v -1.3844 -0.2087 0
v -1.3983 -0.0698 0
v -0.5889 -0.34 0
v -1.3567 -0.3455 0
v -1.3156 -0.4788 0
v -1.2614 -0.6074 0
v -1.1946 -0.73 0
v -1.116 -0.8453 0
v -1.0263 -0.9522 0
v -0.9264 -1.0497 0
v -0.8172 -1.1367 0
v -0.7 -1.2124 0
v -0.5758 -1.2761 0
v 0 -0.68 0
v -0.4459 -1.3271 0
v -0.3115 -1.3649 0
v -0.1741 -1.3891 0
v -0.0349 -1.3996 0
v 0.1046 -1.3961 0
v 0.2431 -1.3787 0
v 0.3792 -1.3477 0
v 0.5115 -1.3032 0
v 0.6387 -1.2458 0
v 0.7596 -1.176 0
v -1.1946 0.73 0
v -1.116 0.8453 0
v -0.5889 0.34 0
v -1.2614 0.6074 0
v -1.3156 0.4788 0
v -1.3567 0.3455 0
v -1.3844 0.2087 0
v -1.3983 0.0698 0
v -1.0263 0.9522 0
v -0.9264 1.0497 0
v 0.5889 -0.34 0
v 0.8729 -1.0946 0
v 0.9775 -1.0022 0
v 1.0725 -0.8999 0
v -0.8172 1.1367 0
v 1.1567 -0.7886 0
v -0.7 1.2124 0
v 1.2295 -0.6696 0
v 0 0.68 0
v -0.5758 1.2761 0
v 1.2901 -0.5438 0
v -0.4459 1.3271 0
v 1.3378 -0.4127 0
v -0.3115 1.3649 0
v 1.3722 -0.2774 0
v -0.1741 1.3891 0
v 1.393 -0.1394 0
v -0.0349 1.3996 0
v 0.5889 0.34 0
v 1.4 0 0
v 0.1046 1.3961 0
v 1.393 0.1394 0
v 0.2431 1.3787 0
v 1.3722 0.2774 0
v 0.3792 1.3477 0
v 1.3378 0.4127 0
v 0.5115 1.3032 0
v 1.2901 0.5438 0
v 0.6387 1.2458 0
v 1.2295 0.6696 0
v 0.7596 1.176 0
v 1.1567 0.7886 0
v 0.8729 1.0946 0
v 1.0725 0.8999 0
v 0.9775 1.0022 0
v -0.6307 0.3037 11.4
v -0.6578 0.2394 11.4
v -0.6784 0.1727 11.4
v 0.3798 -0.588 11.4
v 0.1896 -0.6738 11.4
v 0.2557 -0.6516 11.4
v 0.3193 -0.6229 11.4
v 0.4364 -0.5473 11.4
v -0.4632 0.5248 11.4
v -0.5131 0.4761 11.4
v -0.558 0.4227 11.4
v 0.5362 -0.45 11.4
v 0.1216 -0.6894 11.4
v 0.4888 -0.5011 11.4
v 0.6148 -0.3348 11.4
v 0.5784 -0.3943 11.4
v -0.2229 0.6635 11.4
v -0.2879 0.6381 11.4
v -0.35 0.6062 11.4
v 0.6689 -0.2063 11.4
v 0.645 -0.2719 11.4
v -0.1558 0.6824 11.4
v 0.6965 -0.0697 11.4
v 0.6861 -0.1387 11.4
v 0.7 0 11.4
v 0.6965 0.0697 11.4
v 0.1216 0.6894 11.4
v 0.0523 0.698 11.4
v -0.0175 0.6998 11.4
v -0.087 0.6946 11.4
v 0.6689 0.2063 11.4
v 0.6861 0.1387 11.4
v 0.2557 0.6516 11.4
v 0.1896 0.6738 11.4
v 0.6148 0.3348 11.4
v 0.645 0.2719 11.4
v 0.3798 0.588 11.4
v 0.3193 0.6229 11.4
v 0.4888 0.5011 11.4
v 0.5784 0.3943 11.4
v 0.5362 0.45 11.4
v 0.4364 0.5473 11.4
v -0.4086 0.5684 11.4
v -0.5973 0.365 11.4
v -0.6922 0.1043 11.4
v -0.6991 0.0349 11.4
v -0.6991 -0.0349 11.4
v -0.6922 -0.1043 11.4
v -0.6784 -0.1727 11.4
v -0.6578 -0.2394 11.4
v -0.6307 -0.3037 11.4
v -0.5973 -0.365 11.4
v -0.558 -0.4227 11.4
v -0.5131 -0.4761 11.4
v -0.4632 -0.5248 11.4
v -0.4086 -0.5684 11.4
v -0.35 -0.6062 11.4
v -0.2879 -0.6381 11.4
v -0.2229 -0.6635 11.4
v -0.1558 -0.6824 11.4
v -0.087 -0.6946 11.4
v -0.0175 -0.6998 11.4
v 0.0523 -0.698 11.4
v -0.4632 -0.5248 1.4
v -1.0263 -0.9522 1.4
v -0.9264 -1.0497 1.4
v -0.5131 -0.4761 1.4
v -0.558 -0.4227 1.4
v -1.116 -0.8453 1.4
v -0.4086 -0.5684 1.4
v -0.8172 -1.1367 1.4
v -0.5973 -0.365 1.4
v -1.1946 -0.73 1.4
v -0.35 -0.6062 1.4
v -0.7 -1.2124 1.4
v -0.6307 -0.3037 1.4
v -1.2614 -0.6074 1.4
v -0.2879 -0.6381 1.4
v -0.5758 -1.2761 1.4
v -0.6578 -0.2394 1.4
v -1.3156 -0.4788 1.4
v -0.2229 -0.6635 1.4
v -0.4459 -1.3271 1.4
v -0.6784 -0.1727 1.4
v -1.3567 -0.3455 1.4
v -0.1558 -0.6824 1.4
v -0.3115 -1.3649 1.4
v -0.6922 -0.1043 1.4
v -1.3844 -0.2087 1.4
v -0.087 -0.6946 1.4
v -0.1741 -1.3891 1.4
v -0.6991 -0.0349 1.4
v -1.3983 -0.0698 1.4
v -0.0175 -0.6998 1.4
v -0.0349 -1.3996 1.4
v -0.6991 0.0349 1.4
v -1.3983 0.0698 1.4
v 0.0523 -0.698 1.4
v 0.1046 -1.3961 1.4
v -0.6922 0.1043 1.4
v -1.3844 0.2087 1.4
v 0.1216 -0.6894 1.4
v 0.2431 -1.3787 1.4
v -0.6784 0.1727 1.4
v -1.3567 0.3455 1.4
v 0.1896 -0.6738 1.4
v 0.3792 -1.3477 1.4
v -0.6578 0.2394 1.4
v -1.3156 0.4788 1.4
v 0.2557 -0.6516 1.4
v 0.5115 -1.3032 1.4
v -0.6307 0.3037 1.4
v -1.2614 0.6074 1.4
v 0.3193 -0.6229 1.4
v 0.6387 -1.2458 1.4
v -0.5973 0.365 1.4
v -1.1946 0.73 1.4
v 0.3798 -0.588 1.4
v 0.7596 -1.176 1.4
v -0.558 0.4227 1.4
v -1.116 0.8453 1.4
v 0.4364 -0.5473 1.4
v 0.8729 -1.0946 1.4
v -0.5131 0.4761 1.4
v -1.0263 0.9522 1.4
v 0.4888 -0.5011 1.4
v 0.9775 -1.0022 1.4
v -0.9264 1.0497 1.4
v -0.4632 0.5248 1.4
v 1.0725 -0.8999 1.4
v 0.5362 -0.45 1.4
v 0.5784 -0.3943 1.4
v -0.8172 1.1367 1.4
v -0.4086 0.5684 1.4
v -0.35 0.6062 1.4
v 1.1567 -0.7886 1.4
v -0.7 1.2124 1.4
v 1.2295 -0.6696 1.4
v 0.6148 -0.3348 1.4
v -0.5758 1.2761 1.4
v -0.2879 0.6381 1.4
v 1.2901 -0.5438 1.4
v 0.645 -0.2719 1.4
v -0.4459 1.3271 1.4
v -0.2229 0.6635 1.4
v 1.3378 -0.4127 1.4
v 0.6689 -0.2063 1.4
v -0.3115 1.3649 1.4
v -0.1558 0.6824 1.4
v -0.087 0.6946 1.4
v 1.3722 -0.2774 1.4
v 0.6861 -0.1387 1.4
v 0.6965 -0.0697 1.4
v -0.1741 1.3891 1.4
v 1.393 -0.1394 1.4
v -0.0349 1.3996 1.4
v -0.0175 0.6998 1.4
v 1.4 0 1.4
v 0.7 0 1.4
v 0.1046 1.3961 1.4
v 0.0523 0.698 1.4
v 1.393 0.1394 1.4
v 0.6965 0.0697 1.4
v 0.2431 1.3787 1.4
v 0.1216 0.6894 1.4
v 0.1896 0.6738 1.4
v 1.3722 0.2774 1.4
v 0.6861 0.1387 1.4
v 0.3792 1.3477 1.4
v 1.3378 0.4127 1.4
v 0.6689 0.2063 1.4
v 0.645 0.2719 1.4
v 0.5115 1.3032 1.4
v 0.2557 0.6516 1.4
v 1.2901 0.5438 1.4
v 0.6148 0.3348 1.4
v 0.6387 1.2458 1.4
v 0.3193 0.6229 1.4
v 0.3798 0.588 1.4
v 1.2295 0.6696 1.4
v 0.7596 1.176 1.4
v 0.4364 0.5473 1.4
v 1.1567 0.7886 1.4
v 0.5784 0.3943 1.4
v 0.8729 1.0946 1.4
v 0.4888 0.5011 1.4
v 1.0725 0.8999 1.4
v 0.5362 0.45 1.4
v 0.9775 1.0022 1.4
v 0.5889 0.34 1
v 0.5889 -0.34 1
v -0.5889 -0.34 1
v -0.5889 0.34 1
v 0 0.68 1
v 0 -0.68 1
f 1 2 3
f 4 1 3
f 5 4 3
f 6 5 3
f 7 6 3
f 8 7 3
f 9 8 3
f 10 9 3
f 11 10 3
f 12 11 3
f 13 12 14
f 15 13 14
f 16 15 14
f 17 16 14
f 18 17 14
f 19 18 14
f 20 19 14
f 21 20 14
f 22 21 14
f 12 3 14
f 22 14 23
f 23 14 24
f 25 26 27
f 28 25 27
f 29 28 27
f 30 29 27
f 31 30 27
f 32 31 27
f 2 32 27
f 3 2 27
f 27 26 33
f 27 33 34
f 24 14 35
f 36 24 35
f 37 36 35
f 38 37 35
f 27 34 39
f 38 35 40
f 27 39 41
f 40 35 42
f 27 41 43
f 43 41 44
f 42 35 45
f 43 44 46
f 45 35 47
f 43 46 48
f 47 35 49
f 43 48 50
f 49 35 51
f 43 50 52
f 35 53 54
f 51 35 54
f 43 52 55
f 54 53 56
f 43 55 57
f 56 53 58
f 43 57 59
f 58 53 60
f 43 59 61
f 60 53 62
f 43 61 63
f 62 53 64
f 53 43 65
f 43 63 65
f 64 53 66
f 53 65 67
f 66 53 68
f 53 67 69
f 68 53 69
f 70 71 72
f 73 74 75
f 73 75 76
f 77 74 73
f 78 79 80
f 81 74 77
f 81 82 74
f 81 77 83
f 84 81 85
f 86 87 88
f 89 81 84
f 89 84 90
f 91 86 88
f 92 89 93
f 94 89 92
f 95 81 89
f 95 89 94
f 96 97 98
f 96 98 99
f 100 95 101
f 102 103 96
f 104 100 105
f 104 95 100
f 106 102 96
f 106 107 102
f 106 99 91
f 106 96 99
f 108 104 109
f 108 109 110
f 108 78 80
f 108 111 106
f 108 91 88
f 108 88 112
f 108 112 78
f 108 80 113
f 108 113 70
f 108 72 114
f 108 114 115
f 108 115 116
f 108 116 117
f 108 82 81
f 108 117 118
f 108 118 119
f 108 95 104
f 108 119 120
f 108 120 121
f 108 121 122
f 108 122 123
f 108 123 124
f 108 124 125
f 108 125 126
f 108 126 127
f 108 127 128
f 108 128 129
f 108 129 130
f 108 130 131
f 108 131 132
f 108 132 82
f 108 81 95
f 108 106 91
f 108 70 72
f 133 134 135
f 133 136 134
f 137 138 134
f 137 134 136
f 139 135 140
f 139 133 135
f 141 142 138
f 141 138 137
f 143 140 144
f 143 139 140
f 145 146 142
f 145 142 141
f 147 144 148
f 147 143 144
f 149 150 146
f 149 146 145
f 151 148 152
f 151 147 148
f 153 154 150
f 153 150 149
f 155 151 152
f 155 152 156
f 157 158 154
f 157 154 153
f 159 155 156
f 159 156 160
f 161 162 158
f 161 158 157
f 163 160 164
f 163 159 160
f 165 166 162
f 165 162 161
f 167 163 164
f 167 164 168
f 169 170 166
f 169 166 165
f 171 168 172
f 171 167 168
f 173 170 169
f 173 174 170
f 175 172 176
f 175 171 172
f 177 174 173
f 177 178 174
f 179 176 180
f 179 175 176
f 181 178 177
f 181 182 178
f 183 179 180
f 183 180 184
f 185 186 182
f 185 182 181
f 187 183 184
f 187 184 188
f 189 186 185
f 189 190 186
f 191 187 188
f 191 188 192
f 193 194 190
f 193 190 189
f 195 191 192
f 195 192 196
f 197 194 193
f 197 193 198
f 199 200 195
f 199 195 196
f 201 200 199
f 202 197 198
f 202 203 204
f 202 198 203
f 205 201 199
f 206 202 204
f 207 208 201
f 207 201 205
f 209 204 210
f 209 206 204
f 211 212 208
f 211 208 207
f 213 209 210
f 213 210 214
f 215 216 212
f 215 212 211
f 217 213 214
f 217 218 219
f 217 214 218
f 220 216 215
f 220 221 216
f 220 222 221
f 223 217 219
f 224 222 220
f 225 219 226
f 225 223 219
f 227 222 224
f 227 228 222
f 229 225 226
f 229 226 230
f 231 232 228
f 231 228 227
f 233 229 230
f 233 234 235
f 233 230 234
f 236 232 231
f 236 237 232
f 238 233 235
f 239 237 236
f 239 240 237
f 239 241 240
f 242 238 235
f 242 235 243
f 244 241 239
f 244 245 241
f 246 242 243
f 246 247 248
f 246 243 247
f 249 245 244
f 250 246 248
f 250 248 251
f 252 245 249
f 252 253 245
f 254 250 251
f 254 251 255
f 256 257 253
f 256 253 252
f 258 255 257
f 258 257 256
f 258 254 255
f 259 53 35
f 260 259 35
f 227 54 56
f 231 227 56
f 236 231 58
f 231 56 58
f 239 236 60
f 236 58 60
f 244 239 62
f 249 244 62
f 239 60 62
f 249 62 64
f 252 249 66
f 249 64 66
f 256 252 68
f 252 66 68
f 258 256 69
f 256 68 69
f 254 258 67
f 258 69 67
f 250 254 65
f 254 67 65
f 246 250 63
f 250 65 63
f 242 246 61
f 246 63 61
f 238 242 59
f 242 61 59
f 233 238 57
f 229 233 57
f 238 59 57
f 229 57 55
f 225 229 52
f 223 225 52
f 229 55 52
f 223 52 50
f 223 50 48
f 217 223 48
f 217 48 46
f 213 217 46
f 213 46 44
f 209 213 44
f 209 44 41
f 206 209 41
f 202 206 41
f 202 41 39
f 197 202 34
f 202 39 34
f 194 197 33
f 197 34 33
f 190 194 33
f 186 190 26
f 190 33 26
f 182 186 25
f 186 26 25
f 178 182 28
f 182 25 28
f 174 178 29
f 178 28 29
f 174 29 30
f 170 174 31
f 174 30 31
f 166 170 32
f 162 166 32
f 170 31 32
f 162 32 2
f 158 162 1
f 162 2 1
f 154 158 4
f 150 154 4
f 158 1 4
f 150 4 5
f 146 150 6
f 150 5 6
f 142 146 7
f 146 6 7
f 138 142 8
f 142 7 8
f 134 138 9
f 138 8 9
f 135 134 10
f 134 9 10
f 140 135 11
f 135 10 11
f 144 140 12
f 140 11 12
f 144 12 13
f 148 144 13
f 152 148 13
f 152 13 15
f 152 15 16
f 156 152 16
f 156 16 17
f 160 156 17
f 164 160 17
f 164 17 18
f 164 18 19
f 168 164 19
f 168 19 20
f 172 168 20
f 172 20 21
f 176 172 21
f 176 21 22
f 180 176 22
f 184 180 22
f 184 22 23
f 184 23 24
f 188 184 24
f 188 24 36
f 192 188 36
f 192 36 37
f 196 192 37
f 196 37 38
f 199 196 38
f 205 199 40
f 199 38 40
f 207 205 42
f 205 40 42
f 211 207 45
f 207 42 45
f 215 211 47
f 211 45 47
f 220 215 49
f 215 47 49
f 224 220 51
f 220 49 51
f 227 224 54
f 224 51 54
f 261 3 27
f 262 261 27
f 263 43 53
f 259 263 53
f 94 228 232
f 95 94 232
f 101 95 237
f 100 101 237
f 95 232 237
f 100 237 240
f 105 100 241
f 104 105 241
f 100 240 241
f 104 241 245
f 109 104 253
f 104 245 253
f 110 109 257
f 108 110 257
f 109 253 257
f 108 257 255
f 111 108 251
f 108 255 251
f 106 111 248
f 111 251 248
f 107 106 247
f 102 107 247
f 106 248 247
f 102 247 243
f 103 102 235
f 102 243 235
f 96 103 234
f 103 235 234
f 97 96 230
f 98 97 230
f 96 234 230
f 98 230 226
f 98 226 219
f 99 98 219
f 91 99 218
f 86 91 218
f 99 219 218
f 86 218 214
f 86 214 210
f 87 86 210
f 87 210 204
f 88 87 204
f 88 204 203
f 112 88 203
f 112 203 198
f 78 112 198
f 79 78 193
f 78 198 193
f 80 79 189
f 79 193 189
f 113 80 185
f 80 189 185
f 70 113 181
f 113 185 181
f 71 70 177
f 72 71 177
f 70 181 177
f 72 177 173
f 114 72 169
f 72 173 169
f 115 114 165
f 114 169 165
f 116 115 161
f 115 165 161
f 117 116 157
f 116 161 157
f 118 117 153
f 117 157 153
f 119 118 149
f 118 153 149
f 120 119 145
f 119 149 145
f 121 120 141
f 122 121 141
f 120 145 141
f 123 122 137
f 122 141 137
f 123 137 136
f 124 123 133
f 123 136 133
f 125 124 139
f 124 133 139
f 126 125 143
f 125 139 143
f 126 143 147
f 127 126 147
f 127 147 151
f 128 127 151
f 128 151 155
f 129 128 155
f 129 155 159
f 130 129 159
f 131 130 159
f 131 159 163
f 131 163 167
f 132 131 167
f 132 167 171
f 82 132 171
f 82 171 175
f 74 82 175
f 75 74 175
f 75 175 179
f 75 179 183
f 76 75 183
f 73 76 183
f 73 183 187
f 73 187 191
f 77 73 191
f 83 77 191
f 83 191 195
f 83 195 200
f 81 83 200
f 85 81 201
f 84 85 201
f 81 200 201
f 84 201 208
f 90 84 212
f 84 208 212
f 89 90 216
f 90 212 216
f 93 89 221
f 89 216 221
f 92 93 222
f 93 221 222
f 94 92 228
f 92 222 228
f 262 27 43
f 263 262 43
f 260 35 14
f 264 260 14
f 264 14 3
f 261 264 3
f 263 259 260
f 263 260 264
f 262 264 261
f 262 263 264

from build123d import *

# Parameters (mm, degrees)
SKETCH_1_R          = 1.4
EXTRUDE_1_DEPTH     = 1.4
SKETCH_2_R          = 0.7
EXTRUDE_2_DEPTH     = 10
CUT_EXTRUDE_1_DEPTH = 1


with BuildPart() as part:
    # 草图1 → 凸台-拉伸1 (new body)
    with BuildSketch(Plane.XY):
        Circle(SKETCH_1_R)
    extrude(amount=EXTRUDE_1_DEPTH)

    # 草图2 → 凸台-拉伸2 (add)
    with BuildSketch(Plane.XY.offset(1.4)):
        Circle(SKETCH_2_R)
    extrude(amount=EXTRUDE_2_DEPTH)

    # 草图3 → 切除-拉伸1 (cut)
    with BuildSketch(Plane(origin=(0, 0, 0), x_dir=(-1, 0, 0), z_dir=(0, 0, -1))):
        Polygon((0, 0.68), (-0.588897275, 0.34), (-0.588897275, -0.34), (0, -0.68), (0.588897275, -0.34), (0.588897275, 0.34), align=None)
    extrude(amount=-CUT_EXTRUDE_1_DEPTH, mode=Mode.SUBTRACT)


solid = part.part
